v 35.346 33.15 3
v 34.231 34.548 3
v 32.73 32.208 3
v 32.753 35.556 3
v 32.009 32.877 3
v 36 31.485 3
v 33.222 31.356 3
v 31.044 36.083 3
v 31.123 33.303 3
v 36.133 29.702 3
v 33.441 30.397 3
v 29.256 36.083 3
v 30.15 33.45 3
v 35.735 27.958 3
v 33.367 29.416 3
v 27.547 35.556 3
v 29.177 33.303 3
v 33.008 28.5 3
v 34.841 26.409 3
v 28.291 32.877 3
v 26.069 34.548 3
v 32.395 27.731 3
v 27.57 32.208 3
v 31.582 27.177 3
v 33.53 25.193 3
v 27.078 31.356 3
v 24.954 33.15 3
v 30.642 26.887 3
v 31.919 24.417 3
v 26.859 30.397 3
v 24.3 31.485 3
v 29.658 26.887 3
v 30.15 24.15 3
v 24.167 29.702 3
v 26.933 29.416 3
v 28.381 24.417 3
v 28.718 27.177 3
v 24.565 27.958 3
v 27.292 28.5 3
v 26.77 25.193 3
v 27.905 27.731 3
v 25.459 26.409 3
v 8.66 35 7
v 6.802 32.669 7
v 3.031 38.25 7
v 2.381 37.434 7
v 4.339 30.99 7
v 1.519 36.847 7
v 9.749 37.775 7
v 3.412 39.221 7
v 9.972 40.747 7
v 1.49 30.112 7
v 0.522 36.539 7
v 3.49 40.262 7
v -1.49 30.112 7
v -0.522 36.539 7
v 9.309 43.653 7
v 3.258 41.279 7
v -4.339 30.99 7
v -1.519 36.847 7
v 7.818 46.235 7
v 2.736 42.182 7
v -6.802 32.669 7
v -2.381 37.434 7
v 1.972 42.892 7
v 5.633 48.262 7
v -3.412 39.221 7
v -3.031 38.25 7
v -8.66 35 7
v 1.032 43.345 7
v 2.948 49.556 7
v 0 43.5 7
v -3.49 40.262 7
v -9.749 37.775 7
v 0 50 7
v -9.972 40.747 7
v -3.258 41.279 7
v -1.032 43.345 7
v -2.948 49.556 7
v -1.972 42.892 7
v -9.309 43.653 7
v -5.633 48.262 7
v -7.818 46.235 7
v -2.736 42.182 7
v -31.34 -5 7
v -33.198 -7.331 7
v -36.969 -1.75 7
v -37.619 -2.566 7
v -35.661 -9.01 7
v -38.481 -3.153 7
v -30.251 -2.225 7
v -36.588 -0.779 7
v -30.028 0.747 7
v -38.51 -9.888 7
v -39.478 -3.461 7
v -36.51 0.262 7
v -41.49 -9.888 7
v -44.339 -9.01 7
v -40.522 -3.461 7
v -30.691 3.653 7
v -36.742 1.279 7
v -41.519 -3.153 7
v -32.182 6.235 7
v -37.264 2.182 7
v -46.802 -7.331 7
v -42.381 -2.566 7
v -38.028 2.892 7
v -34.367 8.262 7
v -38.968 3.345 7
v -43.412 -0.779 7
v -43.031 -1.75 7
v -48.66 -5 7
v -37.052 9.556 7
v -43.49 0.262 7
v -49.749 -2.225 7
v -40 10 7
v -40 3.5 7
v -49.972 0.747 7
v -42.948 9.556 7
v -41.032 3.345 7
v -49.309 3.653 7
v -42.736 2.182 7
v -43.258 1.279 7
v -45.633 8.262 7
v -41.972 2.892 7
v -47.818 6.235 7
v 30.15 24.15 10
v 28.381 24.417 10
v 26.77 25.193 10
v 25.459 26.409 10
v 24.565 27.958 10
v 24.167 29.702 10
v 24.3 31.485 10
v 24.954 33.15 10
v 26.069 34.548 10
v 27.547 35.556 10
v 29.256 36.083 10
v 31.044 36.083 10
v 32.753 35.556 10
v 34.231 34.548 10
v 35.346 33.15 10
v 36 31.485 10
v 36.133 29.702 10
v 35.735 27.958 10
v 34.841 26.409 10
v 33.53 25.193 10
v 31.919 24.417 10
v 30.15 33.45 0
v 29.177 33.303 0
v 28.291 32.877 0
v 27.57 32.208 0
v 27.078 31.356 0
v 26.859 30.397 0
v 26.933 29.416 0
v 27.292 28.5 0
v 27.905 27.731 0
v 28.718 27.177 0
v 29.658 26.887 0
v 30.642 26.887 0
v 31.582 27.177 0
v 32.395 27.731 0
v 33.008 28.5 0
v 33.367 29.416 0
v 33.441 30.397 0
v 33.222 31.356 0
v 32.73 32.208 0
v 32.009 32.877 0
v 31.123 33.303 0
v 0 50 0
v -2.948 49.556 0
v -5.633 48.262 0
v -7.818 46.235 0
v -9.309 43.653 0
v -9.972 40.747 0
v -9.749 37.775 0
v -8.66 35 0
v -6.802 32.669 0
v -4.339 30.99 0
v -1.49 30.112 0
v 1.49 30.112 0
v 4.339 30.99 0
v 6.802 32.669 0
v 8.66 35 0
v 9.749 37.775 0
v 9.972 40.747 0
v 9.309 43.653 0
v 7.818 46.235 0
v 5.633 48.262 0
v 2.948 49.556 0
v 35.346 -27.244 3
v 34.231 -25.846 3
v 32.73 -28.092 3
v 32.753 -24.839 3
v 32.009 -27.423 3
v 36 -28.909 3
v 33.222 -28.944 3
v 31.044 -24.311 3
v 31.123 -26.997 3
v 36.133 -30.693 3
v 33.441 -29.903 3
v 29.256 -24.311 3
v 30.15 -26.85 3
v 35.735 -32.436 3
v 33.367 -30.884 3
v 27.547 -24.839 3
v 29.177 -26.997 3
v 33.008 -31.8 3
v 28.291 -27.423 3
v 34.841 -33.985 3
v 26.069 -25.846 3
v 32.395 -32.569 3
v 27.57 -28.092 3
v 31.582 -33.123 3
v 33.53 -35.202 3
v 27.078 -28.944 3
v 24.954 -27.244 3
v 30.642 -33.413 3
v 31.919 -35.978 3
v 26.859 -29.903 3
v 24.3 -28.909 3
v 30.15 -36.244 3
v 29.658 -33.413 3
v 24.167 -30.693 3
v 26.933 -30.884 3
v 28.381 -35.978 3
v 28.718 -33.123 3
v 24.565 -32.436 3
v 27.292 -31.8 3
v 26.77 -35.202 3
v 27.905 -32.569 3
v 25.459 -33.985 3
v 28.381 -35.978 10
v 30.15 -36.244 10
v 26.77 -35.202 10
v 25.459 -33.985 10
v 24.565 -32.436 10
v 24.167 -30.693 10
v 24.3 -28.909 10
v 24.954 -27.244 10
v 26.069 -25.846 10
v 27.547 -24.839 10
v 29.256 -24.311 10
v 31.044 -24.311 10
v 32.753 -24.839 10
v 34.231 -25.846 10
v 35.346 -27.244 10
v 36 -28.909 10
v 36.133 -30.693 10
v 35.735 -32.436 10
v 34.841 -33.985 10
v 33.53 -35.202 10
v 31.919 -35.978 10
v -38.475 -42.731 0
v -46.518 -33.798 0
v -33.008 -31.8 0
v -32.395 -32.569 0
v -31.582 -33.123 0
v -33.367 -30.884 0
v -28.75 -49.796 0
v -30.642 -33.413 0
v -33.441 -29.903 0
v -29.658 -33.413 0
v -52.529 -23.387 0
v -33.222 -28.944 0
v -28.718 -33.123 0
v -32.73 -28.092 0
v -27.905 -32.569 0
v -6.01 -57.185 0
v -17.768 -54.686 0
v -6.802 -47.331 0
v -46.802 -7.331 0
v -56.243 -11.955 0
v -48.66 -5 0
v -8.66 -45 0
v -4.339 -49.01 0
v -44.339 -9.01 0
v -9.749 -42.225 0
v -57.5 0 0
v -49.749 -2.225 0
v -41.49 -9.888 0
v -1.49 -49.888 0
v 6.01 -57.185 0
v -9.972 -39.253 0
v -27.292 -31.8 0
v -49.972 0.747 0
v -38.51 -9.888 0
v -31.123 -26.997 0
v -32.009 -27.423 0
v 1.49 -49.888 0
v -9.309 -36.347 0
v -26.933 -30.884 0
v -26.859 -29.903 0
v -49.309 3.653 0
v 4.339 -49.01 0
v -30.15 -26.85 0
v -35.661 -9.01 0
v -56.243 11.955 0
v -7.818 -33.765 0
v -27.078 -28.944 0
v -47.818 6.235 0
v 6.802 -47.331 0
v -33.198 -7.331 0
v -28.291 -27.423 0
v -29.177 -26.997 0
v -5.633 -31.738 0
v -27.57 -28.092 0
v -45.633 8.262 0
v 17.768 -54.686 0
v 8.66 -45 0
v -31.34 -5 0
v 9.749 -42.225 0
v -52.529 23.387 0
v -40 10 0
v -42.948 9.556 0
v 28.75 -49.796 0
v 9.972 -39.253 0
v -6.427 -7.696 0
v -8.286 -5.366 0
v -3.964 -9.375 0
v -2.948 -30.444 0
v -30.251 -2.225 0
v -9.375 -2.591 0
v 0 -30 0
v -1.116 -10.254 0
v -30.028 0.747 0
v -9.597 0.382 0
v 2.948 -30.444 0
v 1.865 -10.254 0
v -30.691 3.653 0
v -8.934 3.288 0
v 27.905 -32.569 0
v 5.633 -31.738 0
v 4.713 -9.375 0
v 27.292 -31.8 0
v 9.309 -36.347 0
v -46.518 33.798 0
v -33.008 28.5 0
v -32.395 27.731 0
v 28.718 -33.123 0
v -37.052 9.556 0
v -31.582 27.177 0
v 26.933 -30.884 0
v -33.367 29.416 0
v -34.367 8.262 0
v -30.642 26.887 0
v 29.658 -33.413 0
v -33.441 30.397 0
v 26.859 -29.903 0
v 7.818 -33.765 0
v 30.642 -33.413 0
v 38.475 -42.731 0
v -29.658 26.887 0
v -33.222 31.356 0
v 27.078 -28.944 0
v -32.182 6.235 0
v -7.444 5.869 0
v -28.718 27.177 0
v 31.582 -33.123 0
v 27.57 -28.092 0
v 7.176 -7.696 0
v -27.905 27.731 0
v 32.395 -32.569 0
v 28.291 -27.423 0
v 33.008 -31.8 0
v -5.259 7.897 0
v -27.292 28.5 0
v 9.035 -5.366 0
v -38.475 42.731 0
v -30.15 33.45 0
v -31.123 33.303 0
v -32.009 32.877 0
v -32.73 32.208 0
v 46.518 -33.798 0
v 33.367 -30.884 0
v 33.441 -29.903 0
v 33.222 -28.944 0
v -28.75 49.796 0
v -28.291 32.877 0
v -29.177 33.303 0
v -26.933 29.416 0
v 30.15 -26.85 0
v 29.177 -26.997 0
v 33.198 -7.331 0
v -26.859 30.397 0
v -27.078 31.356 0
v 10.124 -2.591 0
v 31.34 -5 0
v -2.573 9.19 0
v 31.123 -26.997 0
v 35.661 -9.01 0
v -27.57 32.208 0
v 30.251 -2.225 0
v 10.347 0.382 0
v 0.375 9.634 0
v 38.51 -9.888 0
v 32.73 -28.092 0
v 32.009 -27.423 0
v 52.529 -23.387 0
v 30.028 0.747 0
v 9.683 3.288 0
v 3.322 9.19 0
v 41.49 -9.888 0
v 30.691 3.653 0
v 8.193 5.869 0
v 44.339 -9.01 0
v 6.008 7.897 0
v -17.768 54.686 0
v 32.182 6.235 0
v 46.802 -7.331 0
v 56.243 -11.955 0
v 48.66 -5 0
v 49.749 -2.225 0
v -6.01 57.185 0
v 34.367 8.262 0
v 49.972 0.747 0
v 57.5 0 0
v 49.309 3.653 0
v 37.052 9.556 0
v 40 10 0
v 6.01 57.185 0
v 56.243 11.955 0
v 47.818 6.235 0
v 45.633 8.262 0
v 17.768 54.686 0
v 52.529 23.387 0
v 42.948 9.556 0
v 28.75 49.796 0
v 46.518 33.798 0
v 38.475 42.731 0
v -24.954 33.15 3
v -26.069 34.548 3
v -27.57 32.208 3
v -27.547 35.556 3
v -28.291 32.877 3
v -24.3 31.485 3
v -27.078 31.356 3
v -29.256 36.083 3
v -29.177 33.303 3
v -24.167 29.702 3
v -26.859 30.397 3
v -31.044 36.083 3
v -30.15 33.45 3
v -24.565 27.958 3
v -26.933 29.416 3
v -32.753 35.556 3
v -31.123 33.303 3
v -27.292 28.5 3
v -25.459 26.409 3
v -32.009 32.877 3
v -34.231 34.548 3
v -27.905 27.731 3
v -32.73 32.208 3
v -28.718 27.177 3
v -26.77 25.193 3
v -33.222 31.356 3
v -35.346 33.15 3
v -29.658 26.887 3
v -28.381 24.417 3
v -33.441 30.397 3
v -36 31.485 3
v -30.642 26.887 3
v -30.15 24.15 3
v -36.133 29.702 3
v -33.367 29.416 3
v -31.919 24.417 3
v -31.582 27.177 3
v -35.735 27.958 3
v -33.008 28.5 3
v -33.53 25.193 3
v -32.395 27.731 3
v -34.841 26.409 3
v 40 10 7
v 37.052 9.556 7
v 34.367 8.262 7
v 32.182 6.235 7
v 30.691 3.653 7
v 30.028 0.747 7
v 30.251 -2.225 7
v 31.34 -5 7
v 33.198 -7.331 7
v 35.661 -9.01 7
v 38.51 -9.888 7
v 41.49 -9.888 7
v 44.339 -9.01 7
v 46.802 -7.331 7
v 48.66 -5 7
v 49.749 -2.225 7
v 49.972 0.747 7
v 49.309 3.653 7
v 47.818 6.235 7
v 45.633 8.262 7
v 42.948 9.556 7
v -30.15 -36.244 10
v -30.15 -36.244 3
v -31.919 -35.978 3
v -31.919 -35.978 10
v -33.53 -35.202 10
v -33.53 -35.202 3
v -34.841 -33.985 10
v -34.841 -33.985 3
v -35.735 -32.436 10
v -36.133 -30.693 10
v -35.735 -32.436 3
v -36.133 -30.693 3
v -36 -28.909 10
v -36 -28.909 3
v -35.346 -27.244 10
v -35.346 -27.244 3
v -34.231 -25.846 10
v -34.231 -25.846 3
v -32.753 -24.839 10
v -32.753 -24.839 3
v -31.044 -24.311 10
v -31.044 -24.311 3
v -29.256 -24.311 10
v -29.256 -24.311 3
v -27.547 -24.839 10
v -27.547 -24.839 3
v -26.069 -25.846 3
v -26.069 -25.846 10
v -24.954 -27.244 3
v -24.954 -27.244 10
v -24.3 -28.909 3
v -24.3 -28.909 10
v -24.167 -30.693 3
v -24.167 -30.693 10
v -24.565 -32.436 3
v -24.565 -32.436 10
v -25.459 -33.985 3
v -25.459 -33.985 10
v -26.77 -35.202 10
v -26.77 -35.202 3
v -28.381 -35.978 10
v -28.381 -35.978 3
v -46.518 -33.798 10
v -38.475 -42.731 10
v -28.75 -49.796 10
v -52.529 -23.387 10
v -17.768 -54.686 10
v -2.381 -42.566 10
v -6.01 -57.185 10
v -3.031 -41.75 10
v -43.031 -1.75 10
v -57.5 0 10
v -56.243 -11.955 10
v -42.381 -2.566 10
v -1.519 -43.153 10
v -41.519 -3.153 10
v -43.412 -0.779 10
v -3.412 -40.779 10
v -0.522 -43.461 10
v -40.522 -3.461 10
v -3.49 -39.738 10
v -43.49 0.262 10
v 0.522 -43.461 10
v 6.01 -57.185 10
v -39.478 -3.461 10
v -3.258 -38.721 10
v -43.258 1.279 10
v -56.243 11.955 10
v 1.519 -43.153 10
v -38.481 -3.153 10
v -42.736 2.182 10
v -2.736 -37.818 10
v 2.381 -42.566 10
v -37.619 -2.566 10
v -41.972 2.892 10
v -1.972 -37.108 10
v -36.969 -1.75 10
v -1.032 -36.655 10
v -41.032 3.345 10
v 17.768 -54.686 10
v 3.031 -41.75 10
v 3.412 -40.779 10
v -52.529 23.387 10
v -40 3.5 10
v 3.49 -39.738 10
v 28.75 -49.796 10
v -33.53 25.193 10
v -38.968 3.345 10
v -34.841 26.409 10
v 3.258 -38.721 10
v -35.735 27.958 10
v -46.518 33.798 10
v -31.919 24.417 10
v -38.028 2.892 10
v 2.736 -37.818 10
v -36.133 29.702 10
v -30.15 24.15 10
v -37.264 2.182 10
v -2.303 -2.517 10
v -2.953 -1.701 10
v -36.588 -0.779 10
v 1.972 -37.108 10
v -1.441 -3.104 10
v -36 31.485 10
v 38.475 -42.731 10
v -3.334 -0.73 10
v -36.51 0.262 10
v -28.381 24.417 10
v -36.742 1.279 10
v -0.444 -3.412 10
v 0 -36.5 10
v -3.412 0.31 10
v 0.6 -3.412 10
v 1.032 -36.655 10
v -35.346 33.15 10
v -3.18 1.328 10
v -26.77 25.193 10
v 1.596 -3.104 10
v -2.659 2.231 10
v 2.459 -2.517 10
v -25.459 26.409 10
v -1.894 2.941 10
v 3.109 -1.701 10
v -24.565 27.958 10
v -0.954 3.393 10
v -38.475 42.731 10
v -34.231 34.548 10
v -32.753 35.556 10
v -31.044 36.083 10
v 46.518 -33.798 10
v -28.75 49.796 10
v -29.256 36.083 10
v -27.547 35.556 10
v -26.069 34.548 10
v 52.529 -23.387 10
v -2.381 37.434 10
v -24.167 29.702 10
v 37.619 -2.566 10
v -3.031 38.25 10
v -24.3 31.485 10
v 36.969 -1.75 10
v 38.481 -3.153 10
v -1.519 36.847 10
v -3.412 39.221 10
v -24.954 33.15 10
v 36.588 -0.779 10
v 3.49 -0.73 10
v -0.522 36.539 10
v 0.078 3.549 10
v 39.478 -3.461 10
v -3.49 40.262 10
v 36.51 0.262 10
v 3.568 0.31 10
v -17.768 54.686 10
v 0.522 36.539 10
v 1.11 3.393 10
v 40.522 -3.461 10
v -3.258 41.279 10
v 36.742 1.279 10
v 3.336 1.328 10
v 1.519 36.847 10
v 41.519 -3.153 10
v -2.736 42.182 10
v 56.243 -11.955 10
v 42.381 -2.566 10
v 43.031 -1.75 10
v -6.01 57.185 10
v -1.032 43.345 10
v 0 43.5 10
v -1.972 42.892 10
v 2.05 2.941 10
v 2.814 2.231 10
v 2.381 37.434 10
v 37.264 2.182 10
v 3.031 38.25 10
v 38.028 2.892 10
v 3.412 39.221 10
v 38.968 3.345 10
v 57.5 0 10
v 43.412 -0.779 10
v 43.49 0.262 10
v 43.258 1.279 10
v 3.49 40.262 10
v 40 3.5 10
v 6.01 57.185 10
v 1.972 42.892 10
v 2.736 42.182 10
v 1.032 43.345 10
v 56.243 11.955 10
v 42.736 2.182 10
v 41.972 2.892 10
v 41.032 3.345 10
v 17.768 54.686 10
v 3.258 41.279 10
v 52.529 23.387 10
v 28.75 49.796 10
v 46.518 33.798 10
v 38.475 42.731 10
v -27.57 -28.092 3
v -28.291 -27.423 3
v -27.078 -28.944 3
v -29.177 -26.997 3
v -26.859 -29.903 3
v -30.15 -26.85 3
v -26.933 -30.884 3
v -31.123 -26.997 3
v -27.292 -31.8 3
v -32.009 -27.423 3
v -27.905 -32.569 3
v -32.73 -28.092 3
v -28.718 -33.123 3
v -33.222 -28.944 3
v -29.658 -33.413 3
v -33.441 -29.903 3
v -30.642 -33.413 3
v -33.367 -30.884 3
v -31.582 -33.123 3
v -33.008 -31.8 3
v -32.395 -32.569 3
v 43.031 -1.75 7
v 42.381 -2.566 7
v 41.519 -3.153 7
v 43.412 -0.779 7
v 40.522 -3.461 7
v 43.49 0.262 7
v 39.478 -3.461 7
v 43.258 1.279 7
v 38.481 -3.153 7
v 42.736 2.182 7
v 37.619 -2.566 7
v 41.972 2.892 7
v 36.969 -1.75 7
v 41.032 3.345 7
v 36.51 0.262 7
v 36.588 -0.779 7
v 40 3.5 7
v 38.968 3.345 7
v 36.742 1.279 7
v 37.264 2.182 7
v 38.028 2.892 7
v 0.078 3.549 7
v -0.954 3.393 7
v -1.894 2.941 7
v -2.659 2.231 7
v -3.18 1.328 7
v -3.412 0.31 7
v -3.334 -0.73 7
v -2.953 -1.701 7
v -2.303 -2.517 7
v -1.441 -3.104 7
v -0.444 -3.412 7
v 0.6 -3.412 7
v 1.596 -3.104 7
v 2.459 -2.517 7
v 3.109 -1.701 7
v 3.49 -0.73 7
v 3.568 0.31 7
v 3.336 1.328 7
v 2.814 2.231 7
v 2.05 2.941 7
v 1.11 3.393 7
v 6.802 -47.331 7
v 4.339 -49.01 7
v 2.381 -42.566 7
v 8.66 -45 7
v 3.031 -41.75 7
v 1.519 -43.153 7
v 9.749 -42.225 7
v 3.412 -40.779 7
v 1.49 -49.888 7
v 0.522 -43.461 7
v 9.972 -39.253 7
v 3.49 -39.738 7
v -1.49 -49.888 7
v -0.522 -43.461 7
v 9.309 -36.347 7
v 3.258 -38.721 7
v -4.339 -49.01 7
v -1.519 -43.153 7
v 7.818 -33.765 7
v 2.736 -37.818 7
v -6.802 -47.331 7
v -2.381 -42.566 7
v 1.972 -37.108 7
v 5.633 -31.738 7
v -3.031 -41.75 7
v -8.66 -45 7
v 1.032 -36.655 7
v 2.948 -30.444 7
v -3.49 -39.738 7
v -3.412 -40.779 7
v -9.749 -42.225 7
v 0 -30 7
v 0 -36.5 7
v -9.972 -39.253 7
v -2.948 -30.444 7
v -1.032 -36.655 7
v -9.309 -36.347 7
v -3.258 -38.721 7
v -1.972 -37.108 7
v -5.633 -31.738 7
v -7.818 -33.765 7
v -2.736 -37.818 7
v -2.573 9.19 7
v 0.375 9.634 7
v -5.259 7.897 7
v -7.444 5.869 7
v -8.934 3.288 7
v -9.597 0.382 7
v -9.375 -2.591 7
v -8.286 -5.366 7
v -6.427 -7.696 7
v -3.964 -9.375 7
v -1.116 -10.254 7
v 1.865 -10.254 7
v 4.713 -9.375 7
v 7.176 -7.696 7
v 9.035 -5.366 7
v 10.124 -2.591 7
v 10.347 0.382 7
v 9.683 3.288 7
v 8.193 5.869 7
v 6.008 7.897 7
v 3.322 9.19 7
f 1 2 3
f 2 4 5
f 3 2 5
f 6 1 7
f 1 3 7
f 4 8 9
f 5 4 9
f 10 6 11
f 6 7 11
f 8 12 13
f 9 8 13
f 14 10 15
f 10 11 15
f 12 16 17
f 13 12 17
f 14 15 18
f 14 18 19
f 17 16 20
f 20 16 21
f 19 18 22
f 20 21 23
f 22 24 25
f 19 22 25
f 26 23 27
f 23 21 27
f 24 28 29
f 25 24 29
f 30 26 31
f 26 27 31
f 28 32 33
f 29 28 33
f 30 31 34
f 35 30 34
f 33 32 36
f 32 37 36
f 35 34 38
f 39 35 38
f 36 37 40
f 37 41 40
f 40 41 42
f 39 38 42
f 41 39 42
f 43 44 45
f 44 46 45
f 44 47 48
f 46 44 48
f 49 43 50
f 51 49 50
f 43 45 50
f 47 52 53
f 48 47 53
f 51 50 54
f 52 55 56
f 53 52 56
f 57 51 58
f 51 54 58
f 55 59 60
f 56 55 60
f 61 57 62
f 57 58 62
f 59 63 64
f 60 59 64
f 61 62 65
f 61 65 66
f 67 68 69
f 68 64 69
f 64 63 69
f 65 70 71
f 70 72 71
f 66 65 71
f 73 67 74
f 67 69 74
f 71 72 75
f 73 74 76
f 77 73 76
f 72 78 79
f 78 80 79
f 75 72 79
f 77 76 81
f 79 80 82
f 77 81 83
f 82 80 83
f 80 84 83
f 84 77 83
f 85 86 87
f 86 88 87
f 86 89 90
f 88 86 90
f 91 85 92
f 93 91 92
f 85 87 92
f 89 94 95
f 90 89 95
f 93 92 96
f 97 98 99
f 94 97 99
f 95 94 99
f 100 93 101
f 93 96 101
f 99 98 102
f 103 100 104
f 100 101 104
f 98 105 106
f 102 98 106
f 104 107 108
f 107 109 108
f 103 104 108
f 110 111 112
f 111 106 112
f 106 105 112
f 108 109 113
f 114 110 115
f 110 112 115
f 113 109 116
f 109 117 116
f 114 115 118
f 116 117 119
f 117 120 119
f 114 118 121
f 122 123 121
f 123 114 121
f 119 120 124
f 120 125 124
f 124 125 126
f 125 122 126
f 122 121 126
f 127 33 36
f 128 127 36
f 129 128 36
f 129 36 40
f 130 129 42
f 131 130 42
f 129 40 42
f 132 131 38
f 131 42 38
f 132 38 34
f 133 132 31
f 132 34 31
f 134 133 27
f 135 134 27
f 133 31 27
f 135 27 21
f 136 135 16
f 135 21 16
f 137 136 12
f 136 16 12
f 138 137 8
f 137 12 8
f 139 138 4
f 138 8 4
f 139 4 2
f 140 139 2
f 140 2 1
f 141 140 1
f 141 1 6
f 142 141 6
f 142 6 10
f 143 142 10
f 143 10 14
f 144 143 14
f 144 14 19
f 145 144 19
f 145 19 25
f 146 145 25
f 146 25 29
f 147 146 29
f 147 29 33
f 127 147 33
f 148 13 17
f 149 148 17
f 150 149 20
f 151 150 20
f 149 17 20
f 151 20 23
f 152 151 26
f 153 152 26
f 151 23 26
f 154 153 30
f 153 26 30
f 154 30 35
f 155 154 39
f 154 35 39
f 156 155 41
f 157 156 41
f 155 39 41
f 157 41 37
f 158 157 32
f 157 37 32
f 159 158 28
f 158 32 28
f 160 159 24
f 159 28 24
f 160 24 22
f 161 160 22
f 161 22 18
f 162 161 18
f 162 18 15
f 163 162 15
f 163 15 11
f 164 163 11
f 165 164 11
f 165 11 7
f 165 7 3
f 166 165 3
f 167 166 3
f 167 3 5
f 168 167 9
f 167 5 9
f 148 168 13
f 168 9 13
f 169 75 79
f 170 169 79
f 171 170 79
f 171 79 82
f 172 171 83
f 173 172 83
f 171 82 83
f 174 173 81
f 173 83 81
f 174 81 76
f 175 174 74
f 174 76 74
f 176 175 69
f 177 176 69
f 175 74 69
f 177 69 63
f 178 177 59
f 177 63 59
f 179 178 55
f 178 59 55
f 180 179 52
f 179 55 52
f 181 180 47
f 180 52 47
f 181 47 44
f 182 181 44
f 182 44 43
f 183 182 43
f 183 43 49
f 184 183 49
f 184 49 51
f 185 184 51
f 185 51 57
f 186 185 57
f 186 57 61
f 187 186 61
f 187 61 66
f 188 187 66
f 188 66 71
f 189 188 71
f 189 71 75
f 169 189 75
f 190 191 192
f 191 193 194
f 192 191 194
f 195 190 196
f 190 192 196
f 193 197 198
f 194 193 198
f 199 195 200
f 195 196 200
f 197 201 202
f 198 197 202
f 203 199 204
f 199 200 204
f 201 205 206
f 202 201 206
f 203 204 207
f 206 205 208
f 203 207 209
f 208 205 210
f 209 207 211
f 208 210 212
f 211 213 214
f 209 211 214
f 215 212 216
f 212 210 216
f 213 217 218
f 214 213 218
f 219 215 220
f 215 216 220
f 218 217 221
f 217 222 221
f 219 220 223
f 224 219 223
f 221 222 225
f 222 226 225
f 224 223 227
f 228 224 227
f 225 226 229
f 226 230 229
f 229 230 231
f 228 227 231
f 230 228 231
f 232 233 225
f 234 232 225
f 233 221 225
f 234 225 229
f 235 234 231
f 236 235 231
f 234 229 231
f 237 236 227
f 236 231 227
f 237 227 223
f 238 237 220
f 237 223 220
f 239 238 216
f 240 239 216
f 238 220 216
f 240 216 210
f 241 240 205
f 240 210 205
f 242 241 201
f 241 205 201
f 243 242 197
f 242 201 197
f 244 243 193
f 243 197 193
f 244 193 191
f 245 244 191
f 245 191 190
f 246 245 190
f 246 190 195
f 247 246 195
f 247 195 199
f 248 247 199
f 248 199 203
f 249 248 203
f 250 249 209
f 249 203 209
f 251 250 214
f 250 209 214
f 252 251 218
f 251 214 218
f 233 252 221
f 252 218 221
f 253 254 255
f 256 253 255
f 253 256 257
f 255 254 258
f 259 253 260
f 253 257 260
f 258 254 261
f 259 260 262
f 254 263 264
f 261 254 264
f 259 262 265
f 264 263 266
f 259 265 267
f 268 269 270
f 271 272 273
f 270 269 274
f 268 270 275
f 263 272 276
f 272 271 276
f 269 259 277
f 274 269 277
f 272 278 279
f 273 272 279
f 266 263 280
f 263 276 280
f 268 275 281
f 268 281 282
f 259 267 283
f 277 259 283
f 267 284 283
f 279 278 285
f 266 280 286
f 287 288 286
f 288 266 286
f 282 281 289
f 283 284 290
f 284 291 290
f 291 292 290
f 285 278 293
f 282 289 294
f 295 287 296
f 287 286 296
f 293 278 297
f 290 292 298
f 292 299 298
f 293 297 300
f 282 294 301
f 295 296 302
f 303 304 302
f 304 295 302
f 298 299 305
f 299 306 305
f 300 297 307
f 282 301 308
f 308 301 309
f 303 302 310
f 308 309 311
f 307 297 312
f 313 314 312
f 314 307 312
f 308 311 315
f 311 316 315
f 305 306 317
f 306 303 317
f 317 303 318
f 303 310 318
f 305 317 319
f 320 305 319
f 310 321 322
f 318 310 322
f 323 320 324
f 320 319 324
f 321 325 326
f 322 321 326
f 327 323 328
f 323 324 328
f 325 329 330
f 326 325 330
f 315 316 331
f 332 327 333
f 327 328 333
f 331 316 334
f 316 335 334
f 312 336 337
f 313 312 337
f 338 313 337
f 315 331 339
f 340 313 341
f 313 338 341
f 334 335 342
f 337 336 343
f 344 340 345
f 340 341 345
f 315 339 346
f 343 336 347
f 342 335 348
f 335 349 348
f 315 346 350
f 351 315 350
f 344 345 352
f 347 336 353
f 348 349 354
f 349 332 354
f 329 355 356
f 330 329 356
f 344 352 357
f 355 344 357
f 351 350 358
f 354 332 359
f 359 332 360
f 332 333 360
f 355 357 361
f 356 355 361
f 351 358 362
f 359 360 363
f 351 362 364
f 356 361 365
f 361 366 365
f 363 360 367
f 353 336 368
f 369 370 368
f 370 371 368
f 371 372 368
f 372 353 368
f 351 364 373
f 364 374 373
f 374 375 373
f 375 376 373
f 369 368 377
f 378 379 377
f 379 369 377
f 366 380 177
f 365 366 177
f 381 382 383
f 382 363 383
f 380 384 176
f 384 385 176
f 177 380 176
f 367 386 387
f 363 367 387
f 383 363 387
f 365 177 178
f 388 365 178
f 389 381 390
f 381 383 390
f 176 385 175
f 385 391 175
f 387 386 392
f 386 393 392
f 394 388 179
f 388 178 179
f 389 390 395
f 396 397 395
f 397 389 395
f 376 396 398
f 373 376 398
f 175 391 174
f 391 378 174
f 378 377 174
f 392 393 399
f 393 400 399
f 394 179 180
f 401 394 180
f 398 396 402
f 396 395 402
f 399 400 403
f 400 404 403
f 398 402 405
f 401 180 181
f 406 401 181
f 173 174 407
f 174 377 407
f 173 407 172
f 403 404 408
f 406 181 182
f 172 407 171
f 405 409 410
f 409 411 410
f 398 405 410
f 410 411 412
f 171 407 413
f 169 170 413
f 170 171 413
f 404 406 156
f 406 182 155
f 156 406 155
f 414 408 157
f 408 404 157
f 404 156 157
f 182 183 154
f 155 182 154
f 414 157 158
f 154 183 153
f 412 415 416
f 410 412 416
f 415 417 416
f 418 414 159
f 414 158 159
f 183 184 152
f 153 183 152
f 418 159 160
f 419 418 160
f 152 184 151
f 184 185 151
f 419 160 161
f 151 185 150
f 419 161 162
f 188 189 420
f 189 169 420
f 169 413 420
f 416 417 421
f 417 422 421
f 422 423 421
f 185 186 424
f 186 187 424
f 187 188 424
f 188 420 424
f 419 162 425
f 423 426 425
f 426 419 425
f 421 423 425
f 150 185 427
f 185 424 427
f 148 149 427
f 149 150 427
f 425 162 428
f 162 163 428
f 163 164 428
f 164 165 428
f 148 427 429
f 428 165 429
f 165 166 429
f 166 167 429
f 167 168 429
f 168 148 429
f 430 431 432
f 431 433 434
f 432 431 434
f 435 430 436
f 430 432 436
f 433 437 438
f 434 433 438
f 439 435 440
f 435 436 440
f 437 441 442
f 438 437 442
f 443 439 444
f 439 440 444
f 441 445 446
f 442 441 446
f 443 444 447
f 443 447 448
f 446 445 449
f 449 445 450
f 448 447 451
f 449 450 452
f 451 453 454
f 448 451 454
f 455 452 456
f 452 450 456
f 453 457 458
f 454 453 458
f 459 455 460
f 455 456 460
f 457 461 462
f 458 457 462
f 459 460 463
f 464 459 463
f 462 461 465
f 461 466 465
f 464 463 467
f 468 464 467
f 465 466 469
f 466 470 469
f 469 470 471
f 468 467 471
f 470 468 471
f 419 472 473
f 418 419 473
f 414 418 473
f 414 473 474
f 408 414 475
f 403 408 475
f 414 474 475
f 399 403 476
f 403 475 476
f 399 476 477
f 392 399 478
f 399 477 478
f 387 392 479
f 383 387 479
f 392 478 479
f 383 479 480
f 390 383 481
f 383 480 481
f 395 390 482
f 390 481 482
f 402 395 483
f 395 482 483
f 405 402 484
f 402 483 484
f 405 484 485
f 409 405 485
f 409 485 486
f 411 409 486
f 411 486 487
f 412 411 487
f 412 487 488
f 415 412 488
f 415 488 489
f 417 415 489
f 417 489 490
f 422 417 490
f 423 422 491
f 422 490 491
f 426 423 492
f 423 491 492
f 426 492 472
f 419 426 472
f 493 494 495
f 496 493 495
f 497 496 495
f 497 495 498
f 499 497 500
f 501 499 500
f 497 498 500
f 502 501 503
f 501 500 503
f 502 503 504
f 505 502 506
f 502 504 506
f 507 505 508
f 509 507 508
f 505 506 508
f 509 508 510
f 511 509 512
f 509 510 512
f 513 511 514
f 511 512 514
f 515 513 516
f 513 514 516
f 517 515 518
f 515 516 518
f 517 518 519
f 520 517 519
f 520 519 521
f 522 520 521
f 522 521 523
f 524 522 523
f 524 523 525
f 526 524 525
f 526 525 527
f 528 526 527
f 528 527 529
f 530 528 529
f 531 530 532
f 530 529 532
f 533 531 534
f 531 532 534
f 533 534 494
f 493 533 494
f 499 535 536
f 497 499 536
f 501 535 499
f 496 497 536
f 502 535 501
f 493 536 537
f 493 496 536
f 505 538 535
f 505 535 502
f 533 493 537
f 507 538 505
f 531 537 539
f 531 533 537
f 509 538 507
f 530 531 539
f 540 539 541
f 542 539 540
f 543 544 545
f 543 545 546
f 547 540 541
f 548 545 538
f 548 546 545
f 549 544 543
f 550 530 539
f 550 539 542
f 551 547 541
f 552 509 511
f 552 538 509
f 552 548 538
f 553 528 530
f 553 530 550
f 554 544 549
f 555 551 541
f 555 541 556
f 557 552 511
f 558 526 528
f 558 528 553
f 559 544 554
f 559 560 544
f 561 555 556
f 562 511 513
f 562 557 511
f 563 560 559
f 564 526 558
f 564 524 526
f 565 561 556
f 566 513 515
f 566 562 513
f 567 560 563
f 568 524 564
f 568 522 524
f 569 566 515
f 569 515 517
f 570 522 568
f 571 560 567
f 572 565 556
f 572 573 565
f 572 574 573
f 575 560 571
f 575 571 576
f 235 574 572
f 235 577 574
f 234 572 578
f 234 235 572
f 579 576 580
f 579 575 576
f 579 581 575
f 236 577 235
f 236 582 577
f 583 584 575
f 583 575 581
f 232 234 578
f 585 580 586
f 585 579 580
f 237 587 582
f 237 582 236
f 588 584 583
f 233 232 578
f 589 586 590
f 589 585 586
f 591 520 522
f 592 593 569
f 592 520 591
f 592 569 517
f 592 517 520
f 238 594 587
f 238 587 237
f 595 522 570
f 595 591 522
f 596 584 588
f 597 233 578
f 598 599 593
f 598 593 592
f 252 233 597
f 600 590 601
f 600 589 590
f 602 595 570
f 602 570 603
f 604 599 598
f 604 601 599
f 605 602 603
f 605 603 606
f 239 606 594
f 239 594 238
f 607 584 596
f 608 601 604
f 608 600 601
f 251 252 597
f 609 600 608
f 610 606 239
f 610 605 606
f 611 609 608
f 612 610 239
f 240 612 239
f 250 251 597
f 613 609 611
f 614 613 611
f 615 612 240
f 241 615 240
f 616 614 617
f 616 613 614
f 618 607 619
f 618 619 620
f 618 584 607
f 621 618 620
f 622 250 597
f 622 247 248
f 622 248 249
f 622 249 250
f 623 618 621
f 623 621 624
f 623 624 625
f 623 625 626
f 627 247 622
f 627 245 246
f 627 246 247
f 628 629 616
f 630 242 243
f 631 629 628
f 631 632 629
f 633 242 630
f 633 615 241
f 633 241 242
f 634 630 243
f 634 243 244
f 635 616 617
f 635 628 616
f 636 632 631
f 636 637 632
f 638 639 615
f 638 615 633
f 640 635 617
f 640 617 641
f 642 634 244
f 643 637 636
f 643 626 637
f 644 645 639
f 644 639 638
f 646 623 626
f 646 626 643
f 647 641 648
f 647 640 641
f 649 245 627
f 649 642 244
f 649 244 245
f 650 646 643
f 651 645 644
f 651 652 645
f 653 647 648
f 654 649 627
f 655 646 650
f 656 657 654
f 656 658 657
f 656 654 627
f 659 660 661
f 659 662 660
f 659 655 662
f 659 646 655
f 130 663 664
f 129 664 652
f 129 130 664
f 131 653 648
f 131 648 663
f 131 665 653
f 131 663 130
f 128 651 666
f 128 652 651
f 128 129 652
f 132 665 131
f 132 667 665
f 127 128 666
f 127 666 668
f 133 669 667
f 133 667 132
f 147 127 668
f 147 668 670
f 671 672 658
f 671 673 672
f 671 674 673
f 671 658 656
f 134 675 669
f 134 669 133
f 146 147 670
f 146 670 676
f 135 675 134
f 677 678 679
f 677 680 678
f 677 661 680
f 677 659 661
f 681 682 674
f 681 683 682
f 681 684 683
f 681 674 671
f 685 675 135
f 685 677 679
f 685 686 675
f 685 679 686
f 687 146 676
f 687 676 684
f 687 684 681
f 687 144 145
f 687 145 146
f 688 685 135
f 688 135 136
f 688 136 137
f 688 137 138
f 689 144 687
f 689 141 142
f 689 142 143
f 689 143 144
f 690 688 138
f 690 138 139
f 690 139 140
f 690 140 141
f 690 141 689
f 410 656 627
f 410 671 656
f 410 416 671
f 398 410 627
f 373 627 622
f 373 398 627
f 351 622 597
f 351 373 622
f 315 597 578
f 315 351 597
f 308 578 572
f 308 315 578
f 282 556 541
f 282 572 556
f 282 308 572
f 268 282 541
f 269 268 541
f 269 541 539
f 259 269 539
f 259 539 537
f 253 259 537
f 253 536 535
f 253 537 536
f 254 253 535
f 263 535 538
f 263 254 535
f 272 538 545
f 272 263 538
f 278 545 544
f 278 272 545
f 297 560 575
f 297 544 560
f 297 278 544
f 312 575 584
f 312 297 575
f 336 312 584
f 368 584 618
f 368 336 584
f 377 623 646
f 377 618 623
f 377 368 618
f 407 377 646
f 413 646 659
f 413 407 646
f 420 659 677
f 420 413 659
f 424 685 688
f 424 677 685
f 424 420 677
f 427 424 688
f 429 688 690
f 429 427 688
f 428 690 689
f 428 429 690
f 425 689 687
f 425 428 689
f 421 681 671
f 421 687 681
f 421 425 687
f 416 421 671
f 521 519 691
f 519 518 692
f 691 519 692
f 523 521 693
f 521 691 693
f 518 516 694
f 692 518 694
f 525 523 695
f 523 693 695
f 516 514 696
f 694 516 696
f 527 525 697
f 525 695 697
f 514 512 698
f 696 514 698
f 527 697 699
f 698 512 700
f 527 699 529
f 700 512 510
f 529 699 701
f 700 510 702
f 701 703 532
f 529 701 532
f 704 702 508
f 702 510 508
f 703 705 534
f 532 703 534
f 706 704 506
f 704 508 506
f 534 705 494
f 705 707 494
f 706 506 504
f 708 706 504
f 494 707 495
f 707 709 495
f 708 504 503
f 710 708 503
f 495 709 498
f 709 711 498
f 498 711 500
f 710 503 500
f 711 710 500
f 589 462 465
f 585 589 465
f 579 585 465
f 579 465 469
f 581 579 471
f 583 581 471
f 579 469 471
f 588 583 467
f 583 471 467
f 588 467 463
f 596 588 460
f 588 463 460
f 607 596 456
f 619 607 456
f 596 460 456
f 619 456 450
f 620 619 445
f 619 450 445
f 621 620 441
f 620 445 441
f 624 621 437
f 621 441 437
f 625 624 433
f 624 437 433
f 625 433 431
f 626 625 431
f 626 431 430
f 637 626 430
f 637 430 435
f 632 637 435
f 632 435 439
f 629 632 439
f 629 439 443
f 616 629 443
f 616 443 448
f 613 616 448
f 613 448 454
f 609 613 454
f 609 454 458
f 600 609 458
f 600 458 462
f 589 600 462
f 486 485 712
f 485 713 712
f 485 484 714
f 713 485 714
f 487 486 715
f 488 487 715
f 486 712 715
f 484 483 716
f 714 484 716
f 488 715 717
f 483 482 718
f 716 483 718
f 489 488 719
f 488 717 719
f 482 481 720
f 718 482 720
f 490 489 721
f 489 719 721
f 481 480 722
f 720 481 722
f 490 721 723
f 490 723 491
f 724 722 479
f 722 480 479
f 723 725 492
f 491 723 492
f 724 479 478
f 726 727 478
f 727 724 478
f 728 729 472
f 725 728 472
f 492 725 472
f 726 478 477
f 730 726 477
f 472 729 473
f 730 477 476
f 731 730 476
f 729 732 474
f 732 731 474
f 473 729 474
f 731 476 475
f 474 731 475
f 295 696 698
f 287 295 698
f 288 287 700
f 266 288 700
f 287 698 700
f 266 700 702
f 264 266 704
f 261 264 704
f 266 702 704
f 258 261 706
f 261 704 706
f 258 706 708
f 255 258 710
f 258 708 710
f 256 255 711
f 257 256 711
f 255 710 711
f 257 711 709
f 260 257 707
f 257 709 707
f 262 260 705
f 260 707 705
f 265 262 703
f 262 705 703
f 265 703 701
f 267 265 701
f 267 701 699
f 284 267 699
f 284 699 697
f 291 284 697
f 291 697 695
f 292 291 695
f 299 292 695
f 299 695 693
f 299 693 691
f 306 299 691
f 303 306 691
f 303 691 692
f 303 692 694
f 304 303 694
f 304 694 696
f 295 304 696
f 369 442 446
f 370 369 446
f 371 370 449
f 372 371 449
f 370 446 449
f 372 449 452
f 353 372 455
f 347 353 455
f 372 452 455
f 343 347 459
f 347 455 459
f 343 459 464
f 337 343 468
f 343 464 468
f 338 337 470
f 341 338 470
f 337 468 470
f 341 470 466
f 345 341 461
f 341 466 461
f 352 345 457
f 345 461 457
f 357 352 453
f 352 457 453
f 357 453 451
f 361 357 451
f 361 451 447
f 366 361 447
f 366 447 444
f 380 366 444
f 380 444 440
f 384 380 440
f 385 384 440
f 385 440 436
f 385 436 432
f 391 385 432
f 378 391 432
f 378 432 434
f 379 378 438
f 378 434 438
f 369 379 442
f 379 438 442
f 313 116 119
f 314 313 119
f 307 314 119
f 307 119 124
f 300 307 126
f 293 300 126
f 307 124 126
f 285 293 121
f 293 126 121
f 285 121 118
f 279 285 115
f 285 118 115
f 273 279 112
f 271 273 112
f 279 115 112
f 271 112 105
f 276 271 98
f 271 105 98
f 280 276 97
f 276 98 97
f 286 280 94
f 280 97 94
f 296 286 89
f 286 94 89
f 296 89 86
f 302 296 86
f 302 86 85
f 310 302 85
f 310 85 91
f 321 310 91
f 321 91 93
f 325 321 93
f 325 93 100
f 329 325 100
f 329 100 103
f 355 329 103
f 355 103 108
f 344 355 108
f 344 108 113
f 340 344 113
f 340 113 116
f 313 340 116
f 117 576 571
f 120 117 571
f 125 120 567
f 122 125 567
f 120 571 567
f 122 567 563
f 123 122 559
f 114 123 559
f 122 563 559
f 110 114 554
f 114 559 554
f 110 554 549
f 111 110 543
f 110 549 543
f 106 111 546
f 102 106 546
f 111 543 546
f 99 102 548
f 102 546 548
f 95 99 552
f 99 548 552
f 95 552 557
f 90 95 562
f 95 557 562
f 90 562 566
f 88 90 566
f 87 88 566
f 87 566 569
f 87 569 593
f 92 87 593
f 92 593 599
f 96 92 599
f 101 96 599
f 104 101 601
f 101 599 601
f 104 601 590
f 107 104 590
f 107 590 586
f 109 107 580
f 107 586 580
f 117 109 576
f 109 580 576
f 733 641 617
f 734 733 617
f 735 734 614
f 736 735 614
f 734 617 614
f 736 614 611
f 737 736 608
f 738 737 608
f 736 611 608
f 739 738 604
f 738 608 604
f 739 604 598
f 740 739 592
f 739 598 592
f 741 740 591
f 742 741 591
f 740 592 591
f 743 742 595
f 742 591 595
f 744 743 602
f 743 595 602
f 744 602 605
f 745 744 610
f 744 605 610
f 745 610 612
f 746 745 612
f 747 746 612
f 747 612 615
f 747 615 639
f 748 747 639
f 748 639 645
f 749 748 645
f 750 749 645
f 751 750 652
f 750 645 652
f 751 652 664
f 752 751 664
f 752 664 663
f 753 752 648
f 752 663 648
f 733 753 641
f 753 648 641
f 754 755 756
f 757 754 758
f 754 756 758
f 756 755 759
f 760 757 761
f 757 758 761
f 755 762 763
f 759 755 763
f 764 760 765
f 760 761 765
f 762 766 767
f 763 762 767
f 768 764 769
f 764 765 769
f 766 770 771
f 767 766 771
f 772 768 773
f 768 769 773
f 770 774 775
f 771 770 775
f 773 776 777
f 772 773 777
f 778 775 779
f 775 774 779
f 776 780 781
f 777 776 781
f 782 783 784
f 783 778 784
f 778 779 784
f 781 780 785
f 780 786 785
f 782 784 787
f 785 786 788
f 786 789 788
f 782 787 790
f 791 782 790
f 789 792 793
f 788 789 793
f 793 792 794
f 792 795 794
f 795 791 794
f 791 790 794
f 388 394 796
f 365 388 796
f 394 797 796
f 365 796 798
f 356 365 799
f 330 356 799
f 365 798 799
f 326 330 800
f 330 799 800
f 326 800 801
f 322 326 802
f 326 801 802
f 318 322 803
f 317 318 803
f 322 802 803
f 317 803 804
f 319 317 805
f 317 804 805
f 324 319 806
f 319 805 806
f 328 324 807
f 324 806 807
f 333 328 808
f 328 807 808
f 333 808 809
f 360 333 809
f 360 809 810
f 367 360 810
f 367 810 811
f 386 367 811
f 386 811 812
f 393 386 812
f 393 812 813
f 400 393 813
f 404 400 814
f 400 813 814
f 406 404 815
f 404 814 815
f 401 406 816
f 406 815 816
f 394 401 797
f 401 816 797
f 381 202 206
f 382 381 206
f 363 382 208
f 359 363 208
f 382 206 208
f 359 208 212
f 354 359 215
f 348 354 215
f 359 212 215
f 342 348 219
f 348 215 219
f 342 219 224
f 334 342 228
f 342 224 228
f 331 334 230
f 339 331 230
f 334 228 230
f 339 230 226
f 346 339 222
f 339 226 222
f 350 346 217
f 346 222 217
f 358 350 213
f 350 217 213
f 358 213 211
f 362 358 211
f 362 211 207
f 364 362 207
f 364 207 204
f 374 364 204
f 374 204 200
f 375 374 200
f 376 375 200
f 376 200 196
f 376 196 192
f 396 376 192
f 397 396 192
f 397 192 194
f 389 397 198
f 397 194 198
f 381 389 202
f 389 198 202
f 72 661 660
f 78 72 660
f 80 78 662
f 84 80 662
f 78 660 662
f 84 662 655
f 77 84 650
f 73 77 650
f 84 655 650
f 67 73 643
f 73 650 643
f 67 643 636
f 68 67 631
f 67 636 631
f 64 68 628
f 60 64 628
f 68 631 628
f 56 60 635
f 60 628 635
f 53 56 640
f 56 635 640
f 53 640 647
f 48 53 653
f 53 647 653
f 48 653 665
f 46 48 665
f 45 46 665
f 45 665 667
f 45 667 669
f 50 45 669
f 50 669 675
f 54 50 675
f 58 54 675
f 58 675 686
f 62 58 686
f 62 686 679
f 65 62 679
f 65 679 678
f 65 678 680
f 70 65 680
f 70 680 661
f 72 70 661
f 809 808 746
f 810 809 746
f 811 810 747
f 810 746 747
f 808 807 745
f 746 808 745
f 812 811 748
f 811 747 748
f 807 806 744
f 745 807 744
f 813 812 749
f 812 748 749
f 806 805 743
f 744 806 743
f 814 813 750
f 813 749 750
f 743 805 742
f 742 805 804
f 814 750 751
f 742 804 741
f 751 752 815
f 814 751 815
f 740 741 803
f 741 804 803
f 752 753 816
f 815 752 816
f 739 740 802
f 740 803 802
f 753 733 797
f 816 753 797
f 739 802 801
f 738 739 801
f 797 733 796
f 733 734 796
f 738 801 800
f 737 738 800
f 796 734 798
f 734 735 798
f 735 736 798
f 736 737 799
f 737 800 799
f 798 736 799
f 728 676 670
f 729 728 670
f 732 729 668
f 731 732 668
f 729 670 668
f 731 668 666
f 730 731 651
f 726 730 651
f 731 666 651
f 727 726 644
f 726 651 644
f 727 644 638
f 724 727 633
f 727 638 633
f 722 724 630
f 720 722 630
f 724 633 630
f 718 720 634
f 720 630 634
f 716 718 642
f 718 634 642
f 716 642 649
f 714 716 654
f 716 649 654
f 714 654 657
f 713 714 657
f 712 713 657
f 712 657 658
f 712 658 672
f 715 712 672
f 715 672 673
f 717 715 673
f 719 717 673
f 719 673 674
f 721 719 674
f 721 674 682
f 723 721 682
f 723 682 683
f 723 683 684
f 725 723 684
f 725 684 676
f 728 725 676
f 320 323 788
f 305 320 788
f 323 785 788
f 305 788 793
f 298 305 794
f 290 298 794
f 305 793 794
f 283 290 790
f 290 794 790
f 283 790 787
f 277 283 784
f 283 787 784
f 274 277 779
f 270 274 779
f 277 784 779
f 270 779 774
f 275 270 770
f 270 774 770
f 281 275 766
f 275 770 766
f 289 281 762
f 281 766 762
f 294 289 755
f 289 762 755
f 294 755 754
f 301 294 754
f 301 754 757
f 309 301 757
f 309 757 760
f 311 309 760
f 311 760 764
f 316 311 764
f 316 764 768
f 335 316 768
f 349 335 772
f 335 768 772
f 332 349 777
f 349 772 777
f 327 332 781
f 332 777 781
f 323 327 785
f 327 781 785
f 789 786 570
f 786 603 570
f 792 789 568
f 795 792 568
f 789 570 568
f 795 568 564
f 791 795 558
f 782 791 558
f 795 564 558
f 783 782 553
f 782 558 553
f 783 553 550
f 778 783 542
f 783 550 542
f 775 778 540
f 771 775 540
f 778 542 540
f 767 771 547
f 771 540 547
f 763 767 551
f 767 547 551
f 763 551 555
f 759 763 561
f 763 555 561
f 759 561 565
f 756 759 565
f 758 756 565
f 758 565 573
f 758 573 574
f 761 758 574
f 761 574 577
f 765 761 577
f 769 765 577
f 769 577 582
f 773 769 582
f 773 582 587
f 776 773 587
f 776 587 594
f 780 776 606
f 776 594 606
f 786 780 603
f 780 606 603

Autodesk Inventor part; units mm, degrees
ref_plane "YZ Plane" through (0, 0, 0) normal (1, 0, 0) x (0, 1, 0)
ref_plane "XZ Plane" through (0, 0, 0) normal (0, 1, 0) x (-1, 0, 0)
ref_plane "XY Plane" through (0, 0, 0) normal (0, 0, 1) x (1, 0, 0)
sketch "Sketch1" plane through (0, 0, 0) normal (0, 0, 1) x (1, 0, 0)
  line L0 (40, -40) -> (-40, -40)
  line L1 (-40, -40) -> (-40, 40)
  line L2 (-40, 40) -> (40, 40)
  line L3 (40, 40) -> (40, -40)
  line L4 (40, -40) -> (-40, 40) construction
  line L5 (-40, -40) -> (40, 40) construction
  circle A0 centre (0, 0) radius 57.5
  dimension "d0" = 80
  dimension "d72" = 115
extrude "Extrusion1" add sketch "Sketch1" along normal blind 10 contours L0 L1 L2 L3 | A0
sketch "Sketch2" plane through (0, 0, 0) normal (0, 0, -1) x (-1, 0, 0)
  arc A0 (40, 37) -> (37, 40) centre (37, 37) ccw
  line L0 (30.15, -30.15) -> (-30.15, -30.15)
  line L1 (-30.15, -30.15) -> (-30.15, 30.15)
  line L2 (-30.15, 30.15) -> (30.15, 30.15)
  line L3 (30.15, 30.15) -> (30.15, -30.15)
  line L4 (30.15, -30.15) -> (-30.15, 30.15) construction
  line L5 (-30.15, -30.15) -> (30.15, 30.15) construction
  circle A1 centre (-30.15, 30.15) radius 4.75
  circle A2 centre (30.15, 30.15) radius 4.75
  circle A3 centre (30.15, -30.15) radius 4.75
  circle A4 centre (-30.15, -30.15) radius 4.75
  point P0 (0, 0)
  point P1 (39.1213, 39.1213)
  dimension "d32" = 60.3
  dimension "d33" = 9.5
hole "Hole3" at (30.15, -30.15, 0) at (30.15, 30.15, 0) at (-30.15, 30.15, 0) at (-30.15, -30.15, 0) direction (0, 0, 1) diameter 6.6 end through all
sketch "Sketch3" plane through (0, 0, 0) normal (0, 0, -1) x (-1, 0, 0)
  circle A0 centre (0, 0) radius 40
  circle A1 centre (0, 40) radius 2.5
  circle A2 centre (40, 0) radius 2.5
  circle A3 centre (0, -40) radius 2.5
  circle A4 centre (-40, 0) radius 2.5
  circle A5 centre (-0.0779, 0.0489) radius 2.5
  dimension "d12" = 5
  dimension "d60" = 80
  dimension "d74" = 5
hole "Hole1" at (40, 0, 0) at (0, 40, 0) at (0, -40, 0) at (-40, 0, 0) at (0.0779, 0.0489, 0) direction (0, 0, 1) diameter 7 end through all
sketch "Sketch8" plane through (0, 0, 0) normal (0, 0, -1) x (-1, 0, 0)
  circle A0 centre (0, 0) radius 40
  circle A1 centre (0, 40) radius 12.0233
  circle A2 centre (40, 0) radius 12.001
  circle A3 centre (-40, 0) radius 12.185
  circle A4 centre (0, -40) radius 12.001
  circle A5 centre (-0.3746, -0.3656) radius 12.0233
  dimension "d61" = 80
hole "Hole4" at (-40, 0, 0) at (0, 40, 0) at (40, 0, 0) at (0, -40, 0) at (0.3746, -0.3656, 0) direction (0, 0, 1) diameter 20 depth 7
sketch "Sketch10" plane through (0, 0, 10) normal (0, 0, 1) x (1, 0, 0)
  circle A0 centre (30.15, 30.15) radius 3.3 projected
  circle A1 centre (30.15, 30.15) radius 6
  circle A2 centre (-30.15, 30.15) radius 3.3 projected
  circle A3 centre (-30.15, 30.15) radius 6
  circle A4 centre (-30.15, -30.2444) radius 6
  circle A5 centre (30.15, -30.2444) radius 6
  point P0 (0, 0)
  dimension "d63" = 12
hole "Hole5" at (-30.15, -30.2444, 10) at (30.15, -30.2444, 10) at (30.15, 30.15, 10) at (-30.15, 30.15, 10) direction (0, 0, -1) diameter 12 depth 7
properties part number "adaptor_spine_base"
